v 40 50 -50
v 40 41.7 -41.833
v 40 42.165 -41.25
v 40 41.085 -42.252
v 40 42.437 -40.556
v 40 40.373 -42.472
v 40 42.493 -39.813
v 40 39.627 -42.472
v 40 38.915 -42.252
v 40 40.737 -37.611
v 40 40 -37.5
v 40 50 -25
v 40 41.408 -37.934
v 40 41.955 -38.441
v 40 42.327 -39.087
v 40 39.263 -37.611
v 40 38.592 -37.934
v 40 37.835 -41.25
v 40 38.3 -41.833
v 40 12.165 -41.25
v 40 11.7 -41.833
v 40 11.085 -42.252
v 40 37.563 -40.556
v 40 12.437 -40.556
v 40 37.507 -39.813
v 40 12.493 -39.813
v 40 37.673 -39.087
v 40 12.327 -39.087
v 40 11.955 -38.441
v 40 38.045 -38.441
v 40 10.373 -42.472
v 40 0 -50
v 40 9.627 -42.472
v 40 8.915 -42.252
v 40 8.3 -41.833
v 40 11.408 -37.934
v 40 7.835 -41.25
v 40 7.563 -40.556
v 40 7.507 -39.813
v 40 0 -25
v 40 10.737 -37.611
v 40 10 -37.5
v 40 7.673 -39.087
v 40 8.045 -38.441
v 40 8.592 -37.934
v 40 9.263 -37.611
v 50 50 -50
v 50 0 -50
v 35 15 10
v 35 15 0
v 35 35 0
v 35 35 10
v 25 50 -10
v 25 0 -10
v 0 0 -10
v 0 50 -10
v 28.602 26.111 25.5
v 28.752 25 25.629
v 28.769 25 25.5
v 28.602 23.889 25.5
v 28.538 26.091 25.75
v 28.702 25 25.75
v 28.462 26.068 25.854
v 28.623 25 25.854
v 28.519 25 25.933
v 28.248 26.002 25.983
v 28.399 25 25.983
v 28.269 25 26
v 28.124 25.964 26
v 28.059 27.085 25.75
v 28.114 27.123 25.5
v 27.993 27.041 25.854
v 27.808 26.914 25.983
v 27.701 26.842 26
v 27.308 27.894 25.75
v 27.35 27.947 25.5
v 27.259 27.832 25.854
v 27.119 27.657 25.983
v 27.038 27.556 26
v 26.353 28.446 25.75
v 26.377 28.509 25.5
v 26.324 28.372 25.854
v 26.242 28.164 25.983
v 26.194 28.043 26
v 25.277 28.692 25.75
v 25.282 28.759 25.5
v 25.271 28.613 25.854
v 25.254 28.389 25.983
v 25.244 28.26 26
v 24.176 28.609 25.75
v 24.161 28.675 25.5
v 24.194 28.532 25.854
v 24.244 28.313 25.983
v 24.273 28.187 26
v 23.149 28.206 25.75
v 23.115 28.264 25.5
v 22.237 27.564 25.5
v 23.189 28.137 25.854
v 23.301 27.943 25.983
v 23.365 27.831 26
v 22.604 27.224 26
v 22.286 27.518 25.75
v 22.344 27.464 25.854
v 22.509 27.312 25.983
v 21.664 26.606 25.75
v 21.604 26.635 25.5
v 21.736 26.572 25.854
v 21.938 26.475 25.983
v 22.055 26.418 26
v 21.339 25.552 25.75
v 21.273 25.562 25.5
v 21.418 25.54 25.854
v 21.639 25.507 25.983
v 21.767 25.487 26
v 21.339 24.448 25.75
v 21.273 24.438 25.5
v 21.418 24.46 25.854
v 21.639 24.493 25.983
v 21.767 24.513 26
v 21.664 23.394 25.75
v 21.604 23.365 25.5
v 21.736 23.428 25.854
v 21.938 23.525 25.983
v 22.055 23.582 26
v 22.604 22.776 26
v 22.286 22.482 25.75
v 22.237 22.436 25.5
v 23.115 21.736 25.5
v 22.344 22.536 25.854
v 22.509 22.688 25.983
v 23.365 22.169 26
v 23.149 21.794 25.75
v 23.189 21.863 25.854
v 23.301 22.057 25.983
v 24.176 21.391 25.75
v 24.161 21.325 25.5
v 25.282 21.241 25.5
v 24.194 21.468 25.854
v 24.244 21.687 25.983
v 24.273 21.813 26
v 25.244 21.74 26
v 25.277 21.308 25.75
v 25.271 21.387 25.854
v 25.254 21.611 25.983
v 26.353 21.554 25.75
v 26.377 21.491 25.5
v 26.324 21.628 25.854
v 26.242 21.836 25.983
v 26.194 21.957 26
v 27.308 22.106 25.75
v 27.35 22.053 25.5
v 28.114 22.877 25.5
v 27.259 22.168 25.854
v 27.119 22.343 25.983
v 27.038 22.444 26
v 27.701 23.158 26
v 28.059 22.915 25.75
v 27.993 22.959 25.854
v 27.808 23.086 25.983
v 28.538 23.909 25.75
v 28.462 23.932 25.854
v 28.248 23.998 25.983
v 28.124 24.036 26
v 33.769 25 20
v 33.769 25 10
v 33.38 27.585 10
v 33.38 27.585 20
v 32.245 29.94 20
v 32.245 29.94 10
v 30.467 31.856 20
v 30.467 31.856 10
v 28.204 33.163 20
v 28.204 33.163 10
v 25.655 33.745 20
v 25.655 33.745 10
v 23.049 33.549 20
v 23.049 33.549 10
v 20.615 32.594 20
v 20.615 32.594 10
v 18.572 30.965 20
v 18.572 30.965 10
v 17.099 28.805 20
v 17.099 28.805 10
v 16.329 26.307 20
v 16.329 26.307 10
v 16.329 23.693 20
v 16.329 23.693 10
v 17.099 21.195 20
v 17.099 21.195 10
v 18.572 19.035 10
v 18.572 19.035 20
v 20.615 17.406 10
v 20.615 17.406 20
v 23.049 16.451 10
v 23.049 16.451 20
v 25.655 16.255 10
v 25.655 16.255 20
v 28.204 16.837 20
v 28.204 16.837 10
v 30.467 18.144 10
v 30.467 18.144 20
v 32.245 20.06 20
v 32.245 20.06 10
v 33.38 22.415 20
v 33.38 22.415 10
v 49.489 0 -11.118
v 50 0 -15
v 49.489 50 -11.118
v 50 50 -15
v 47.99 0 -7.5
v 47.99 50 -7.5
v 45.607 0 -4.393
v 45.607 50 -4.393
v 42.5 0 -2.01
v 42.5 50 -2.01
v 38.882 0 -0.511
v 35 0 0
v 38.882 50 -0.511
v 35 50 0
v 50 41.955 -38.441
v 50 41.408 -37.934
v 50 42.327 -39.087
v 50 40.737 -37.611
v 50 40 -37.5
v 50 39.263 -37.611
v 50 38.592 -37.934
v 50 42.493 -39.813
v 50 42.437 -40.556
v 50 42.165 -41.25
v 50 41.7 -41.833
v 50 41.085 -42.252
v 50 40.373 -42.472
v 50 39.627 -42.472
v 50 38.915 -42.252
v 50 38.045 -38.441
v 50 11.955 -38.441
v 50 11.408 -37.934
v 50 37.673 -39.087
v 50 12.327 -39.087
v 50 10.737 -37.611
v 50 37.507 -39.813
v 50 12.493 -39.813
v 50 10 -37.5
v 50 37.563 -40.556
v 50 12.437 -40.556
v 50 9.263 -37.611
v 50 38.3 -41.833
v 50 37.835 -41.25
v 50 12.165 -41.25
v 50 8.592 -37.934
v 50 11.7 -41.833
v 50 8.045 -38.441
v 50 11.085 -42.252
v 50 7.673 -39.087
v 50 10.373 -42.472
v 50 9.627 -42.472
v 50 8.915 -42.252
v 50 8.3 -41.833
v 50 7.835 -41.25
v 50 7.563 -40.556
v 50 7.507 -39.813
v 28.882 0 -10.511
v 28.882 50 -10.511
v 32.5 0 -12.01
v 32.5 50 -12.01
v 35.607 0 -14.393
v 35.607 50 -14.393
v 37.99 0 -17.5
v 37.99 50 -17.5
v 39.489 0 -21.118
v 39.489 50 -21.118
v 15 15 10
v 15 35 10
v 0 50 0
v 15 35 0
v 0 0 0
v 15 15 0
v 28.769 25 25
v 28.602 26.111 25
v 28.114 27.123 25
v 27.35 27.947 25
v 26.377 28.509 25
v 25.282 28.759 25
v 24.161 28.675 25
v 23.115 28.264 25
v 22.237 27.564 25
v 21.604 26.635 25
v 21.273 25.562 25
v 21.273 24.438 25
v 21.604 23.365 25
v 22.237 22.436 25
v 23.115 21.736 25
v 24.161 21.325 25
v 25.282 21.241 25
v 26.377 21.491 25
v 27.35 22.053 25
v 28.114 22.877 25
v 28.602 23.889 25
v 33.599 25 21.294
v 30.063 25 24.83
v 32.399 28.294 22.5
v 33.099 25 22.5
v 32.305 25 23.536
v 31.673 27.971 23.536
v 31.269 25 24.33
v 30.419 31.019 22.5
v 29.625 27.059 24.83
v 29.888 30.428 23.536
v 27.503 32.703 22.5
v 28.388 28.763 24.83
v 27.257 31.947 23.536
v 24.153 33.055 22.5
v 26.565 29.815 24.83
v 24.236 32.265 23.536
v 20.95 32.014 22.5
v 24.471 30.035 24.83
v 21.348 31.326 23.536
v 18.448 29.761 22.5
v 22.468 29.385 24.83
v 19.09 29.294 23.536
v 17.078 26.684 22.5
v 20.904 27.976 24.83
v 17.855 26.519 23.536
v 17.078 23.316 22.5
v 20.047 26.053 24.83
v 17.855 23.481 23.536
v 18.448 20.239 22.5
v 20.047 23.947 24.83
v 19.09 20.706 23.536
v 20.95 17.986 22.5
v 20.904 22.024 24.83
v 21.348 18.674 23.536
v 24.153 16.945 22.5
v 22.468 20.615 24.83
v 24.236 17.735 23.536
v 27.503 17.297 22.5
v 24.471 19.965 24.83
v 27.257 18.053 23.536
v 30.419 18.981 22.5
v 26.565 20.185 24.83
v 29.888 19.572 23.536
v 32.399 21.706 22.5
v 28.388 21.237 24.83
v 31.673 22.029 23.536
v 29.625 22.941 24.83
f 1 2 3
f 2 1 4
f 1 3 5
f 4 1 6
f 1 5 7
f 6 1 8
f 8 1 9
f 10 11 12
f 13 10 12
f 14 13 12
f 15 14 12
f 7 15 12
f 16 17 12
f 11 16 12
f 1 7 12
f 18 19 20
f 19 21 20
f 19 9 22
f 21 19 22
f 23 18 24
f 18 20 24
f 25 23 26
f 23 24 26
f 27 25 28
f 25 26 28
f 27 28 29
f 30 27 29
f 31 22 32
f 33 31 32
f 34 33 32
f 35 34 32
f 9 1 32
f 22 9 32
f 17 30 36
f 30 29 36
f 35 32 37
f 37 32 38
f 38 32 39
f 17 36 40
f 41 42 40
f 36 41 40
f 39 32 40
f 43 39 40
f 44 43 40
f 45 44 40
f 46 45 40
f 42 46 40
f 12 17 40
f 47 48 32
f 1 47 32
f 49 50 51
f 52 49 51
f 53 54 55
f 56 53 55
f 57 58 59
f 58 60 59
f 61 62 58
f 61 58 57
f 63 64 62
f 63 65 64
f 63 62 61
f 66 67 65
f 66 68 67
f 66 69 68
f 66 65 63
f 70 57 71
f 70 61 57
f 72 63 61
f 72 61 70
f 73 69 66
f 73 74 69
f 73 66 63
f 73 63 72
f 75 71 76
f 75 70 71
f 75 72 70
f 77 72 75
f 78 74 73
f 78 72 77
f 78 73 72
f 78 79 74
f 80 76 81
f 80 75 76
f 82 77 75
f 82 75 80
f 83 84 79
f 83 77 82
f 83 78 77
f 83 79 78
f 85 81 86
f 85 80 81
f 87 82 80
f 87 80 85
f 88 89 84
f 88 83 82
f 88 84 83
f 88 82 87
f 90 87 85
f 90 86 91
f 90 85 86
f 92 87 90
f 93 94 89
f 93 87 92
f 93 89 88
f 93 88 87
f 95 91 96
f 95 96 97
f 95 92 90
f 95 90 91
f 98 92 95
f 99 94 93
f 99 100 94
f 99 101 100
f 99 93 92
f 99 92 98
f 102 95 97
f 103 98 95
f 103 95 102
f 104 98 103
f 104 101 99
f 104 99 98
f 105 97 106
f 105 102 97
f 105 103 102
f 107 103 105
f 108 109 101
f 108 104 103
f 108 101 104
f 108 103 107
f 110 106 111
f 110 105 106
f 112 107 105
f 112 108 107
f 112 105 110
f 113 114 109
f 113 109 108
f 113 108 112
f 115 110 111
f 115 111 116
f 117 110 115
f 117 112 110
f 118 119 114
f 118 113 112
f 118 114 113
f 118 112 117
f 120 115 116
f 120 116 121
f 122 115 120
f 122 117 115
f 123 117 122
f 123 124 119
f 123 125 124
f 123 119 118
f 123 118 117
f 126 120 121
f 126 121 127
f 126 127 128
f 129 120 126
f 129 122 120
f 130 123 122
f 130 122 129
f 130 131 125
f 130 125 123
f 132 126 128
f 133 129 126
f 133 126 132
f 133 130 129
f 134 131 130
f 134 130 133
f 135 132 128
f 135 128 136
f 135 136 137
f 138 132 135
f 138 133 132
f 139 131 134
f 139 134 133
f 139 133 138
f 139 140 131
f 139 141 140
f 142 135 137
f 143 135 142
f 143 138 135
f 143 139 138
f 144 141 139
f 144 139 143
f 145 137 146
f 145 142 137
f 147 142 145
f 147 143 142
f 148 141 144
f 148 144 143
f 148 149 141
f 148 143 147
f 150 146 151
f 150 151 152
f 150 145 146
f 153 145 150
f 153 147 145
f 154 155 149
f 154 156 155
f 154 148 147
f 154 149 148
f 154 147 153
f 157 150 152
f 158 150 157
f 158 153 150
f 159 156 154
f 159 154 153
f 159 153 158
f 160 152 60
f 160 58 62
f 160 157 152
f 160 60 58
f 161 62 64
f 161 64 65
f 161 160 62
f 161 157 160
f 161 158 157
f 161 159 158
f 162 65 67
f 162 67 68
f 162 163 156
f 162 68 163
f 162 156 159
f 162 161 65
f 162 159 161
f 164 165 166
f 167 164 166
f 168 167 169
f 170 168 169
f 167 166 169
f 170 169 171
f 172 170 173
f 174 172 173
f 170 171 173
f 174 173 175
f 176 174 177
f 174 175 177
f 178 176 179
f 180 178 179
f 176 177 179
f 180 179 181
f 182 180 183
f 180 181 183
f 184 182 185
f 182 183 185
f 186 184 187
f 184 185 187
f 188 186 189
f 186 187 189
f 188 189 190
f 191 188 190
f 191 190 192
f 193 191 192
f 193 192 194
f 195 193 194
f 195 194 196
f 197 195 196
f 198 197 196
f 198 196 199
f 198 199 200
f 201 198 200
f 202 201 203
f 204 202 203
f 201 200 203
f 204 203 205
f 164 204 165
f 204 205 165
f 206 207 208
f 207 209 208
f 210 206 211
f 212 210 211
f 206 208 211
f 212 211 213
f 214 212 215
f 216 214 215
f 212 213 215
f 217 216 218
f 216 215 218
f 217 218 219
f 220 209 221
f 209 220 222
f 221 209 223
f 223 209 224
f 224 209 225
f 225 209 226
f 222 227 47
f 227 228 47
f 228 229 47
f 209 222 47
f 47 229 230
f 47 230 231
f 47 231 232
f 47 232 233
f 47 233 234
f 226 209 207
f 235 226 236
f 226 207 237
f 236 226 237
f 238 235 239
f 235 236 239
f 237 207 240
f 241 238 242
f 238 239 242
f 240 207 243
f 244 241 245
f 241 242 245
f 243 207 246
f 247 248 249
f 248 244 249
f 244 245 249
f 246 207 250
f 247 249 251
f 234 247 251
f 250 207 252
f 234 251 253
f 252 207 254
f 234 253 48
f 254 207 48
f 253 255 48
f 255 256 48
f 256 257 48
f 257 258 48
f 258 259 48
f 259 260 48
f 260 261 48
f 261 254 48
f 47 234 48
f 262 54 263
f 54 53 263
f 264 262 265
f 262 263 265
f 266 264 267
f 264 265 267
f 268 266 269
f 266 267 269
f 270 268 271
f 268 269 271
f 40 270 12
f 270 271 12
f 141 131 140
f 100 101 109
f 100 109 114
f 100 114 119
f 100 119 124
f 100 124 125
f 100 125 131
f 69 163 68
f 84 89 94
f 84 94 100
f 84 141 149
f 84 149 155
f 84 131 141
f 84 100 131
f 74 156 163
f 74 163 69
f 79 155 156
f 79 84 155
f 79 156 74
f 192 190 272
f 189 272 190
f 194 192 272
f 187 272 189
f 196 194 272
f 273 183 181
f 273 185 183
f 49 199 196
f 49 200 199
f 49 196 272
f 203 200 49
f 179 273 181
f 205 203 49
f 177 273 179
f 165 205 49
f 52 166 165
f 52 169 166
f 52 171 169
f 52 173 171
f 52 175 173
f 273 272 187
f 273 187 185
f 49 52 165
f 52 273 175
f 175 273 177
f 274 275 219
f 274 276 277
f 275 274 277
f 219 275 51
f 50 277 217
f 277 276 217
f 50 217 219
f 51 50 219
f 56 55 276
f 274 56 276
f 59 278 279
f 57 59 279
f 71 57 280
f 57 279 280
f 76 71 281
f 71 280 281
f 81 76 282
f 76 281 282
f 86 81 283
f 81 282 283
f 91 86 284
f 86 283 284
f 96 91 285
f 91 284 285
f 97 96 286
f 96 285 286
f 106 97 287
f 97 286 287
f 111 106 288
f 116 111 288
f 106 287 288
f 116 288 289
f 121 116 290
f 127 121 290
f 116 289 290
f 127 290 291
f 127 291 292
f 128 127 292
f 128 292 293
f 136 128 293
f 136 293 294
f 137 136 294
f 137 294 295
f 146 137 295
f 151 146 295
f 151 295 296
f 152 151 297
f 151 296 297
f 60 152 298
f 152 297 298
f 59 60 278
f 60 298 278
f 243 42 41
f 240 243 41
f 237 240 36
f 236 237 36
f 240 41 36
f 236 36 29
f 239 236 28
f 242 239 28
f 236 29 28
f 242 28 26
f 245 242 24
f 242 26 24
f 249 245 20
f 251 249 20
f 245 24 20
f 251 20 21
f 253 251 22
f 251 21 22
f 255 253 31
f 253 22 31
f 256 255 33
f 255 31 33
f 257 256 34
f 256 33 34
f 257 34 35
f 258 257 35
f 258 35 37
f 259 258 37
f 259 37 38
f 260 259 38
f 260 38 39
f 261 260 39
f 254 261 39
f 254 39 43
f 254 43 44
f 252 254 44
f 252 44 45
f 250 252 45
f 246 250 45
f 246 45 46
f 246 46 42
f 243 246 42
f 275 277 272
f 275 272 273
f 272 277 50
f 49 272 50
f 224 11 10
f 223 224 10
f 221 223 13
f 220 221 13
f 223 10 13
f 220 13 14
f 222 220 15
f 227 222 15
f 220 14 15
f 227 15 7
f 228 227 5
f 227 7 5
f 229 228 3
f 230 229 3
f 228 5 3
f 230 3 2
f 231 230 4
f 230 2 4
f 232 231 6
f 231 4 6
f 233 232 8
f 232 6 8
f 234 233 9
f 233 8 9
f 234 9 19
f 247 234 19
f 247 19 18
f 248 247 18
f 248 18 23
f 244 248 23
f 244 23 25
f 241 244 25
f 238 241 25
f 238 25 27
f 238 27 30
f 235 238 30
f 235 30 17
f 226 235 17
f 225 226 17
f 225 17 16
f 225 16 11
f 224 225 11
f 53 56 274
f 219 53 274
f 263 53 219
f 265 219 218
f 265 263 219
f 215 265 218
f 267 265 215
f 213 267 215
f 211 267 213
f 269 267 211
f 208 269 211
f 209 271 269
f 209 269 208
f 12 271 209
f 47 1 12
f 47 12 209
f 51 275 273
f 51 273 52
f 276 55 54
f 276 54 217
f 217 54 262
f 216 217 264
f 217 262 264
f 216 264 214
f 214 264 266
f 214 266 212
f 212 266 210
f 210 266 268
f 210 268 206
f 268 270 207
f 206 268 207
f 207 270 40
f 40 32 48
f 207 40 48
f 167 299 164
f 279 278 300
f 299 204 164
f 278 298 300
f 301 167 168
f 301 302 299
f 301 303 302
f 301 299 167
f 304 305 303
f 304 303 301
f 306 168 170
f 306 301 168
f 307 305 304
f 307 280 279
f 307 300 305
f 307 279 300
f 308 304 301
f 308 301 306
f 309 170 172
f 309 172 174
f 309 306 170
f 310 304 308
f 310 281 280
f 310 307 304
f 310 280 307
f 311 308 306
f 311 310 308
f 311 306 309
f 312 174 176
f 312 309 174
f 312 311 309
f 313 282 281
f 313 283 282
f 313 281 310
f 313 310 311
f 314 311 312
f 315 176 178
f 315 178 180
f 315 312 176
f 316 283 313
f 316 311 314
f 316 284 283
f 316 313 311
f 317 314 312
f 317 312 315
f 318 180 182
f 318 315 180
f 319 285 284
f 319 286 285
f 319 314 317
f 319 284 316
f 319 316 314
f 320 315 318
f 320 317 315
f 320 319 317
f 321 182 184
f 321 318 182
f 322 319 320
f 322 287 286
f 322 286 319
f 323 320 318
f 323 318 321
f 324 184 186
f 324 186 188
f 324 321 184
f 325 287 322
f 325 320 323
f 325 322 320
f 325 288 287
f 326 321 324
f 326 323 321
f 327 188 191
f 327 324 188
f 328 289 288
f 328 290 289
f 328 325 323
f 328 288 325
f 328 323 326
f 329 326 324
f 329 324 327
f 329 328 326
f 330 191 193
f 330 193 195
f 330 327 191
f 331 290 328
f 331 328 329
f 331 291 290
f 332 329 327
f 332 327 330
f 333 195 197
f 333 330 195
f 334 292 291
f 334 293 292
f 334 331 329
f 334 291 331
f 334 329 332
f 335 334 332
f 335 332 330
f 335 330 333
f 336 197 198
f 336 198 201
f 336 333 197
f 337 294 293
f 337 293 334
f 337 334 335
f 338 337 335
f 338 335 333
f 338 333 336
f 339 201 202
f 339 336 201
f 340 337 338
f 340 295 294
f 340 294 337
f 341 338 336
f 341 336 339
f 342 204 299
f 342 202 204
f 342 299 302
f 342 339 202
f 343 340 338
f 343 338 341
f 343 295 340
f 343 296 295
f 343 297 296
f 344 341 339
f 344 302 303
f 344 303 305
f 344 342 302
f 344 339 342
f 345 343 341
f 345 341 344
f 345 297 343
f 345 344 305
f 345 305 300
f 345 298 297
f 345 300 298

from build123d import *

# Parameters (mm, degrees)
BOSS_EXTRUDE1_DEPTH = 50
SKETCH2_R           = 2.5
CUT_EXTRUDE2_DEPTH  = 50
SKETCH3_W           = 20
SKETCH3_H           = 20
BOSS_EXTRUDE2_DEPTH = 10
SKETCH4_R           = 8.769113897
BOSS_EXTRUDE3_DEPTH = 15
FILLET1_R           = 5
FILLET2_R           = 15
FILLET3_R           = 15
SKETCH7_R           = 3.769113897
BOSS_EXTRUDE4_DEPTH = 1
FILLET5_R           = 0.5


with BuildPart() as part:
    # Sketch1 → Boss-Extrude1 (new body)
    with BuildSketch(Plane(origin=(0, 0, 0), x_dir=(1, 0, 0), z_dir=(0, 1, 0))):
        Polygon((0, 0), (50, 0), (50, 50), (40, 50), (40, 10), (0, 10), align=None)
    extrude(amount=BOSS_EXTRUDE1_DEPTH)

    # Sketch2 → Cut-Extrude2 (cut)
    with BuildSketch(Plane.ZY.offset(-40)):
        with Locations((-40, 10)):
            Circle(SKETCH2_R)
        with Locations((-40, 40)):
            Circle(SKETCH2_R)
    extrude(amount=-CUT_EXTRUDE2_DEPTH, mode=Mode.SUBTRACT)

    # Sketch3 → Boss-Extrude2 (add)
    with BuildSketch(Plane.XY):
        with Locations((25, 25)):
            Rectangle(SKETCH3_W, SKETCH3_H)
    extrude(amount=BOSS_EXTRUDE2_DEPTH)

    # Sketch4 → Boss-Extrude3 (add)
    with BuildSketch(Plane.XY.offset(10)):
        with Locations((25, 25)):
            Circle(SKETCH4_R)
    extrude(amount=BOSS_EXTRUDE3_DEPTH)

    # Fillet1
    fillet1_edges = [part.edges().sort_by_distance(p)[0] for p in [
        (16.230886103, 25, 25),
    ]]
    fillet(fillet1_edges, radius=FILLET1_R)

    # Fillet2
    fillet2_edges = [part.edges().sort_by_distance(p)[0] for p in [
        (40, 25, -10),
    ]]
    fillet(fillet2_edges, radius=FILLET2_R)

    # Fillet3
    fillet3_edges = [part.edges().sort_by_distance(p)[0] for p in [
        (50, 25, 0),
    ]]
    fillet(fillet3_edges, radius=FILLET3_R - 0.0001)  # a hair under: the kernel refuses the full size

    # Sketch7 → Boss-Extrude4 (add)
    with BuildSketch(Plane.XY.offset(25)):
        with Locations((25, 25)):
            Circle(SKETCH7_R)
    extrude(amount=BOSS_EXTRUDE4_DEPTH)

    # Fillet5
    fillet5_edges = [part.edges().sort_by_distance(p)[0] for p in [
        (21.230886103, 25, 26),
    ]]
    fillet(fillet5_edges, radius=FILLET5_R)


solid = part.part
